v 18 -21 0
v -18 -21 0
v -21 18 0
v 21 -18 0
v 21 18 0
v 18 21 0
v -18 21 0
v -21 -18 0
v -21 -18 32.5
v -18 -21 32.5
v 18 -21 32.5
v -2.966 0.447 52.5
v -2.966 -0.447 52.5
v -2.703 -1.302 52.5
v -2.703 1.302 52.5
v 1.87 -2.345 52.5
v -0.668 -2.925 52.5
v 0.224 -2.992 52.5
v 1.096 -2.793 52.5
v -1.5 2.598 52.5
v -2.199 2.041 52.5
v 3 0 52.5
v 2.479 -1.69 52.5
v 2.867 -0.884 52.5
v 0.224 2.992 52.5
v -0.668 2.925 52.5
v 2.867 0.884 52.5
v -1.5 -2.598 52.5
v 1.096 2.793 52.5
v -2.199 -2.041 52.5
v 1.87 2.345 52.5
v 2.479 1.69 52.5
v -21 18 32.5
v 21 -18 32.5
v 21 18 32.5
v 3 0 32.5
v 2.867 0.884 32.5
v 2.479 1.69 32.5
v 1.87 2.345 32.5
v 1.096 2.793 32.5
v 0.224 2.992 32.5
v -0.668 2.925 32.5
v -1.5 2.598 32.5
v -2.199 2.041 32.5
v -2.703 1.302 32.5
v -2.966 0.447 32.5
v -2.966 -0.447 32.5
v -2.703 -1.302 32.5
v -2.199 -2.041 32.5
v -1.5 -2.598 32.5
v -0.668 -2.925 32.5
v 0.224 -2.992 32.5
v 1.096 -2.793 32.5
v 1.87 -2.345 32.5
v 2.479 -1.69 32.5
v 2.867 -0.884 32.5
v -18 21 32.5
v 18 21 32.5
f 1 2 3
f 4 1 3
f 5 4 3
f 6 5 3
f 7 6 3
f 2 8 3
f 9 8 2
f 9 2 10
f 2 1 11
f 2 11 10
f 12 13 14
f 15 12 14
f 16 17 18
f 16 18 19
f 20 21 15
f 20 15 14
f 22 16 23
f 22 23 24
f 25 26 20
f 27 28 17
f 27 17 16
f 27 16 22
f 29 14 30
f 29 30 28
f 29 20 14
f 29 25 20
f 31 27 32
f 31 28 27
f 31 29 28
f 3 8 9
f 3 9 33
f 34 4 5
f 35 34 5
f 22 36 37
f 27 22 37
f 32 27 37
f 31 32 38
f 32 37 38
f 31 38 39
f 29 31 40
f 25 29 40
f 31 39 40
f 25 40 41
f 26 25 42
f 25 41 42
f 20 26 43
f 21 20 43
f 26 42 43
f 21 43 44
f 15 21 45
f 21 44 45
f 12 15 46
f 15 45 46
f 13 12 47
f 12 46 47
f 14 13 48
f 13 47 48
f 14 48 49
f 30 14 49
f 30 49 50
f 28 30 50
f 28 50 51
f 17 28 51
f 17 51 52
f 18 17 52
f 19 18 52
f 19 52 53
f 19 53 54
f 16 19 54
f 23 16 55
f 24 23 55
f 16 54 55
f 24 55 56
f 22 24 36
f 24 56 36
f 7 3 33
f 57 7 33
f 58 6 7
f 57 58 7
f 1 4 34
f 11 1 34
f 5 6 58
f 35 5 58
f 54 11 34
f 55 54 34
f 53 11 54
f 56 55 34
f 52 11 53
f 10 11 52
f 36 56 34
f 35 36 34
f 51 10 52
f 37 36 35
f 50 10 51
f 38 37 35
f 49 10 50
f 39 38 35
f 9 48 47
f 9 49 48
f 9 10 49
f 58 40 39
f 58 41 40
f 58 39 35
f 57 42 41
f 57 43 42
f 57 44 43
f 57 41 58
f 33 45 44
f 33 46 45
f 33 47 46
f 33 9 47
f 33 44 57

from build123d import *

# Parameters (mm, degrees)
SKETCH1_W           = 42
SKETCH1_H           = 42
BOSS_EXTRUDE1_DEPTH = 32.5
CHAMFER1_SIZE       = 3
SKETCH2_R           = 3
BOSS_EXTRUDE2_DEPTH = 20


with BuildPart() as part:
    # Sketch1 → Boss-Extrude1 (new body)
    with BuildSketch(Plane(origin=(0, 0, 0), x_dir=(0, 1, 0), z_dir=(0, 0, 1))):
        Rectangle(SKETCH1_W, SKETCH1_H)
    extrude(amount=BOSS_EXTRUDE1_DEPTH)

    # Chamfer1
    chamfer1_edges = [part.edges().sort_by_distance(p)[0] for p in [
        (21, 21, 16.25),
        (21, -21, 16.25),
        (-21, -21, 16.25),
        (-21, 21, 16.25),
    ]]
    chamfer(chamfer1_edges, length=CHAMFER1_SIZE)

    # Sketch2 → Boss-Extrude2 (add)
    with BuildSketch(Plane.XY.offset(32.5)):
        Circle(SKETCH2_R)
    extrude(amount=BOSS_EXTRUDE2_DEPTH)


solid = part.part
